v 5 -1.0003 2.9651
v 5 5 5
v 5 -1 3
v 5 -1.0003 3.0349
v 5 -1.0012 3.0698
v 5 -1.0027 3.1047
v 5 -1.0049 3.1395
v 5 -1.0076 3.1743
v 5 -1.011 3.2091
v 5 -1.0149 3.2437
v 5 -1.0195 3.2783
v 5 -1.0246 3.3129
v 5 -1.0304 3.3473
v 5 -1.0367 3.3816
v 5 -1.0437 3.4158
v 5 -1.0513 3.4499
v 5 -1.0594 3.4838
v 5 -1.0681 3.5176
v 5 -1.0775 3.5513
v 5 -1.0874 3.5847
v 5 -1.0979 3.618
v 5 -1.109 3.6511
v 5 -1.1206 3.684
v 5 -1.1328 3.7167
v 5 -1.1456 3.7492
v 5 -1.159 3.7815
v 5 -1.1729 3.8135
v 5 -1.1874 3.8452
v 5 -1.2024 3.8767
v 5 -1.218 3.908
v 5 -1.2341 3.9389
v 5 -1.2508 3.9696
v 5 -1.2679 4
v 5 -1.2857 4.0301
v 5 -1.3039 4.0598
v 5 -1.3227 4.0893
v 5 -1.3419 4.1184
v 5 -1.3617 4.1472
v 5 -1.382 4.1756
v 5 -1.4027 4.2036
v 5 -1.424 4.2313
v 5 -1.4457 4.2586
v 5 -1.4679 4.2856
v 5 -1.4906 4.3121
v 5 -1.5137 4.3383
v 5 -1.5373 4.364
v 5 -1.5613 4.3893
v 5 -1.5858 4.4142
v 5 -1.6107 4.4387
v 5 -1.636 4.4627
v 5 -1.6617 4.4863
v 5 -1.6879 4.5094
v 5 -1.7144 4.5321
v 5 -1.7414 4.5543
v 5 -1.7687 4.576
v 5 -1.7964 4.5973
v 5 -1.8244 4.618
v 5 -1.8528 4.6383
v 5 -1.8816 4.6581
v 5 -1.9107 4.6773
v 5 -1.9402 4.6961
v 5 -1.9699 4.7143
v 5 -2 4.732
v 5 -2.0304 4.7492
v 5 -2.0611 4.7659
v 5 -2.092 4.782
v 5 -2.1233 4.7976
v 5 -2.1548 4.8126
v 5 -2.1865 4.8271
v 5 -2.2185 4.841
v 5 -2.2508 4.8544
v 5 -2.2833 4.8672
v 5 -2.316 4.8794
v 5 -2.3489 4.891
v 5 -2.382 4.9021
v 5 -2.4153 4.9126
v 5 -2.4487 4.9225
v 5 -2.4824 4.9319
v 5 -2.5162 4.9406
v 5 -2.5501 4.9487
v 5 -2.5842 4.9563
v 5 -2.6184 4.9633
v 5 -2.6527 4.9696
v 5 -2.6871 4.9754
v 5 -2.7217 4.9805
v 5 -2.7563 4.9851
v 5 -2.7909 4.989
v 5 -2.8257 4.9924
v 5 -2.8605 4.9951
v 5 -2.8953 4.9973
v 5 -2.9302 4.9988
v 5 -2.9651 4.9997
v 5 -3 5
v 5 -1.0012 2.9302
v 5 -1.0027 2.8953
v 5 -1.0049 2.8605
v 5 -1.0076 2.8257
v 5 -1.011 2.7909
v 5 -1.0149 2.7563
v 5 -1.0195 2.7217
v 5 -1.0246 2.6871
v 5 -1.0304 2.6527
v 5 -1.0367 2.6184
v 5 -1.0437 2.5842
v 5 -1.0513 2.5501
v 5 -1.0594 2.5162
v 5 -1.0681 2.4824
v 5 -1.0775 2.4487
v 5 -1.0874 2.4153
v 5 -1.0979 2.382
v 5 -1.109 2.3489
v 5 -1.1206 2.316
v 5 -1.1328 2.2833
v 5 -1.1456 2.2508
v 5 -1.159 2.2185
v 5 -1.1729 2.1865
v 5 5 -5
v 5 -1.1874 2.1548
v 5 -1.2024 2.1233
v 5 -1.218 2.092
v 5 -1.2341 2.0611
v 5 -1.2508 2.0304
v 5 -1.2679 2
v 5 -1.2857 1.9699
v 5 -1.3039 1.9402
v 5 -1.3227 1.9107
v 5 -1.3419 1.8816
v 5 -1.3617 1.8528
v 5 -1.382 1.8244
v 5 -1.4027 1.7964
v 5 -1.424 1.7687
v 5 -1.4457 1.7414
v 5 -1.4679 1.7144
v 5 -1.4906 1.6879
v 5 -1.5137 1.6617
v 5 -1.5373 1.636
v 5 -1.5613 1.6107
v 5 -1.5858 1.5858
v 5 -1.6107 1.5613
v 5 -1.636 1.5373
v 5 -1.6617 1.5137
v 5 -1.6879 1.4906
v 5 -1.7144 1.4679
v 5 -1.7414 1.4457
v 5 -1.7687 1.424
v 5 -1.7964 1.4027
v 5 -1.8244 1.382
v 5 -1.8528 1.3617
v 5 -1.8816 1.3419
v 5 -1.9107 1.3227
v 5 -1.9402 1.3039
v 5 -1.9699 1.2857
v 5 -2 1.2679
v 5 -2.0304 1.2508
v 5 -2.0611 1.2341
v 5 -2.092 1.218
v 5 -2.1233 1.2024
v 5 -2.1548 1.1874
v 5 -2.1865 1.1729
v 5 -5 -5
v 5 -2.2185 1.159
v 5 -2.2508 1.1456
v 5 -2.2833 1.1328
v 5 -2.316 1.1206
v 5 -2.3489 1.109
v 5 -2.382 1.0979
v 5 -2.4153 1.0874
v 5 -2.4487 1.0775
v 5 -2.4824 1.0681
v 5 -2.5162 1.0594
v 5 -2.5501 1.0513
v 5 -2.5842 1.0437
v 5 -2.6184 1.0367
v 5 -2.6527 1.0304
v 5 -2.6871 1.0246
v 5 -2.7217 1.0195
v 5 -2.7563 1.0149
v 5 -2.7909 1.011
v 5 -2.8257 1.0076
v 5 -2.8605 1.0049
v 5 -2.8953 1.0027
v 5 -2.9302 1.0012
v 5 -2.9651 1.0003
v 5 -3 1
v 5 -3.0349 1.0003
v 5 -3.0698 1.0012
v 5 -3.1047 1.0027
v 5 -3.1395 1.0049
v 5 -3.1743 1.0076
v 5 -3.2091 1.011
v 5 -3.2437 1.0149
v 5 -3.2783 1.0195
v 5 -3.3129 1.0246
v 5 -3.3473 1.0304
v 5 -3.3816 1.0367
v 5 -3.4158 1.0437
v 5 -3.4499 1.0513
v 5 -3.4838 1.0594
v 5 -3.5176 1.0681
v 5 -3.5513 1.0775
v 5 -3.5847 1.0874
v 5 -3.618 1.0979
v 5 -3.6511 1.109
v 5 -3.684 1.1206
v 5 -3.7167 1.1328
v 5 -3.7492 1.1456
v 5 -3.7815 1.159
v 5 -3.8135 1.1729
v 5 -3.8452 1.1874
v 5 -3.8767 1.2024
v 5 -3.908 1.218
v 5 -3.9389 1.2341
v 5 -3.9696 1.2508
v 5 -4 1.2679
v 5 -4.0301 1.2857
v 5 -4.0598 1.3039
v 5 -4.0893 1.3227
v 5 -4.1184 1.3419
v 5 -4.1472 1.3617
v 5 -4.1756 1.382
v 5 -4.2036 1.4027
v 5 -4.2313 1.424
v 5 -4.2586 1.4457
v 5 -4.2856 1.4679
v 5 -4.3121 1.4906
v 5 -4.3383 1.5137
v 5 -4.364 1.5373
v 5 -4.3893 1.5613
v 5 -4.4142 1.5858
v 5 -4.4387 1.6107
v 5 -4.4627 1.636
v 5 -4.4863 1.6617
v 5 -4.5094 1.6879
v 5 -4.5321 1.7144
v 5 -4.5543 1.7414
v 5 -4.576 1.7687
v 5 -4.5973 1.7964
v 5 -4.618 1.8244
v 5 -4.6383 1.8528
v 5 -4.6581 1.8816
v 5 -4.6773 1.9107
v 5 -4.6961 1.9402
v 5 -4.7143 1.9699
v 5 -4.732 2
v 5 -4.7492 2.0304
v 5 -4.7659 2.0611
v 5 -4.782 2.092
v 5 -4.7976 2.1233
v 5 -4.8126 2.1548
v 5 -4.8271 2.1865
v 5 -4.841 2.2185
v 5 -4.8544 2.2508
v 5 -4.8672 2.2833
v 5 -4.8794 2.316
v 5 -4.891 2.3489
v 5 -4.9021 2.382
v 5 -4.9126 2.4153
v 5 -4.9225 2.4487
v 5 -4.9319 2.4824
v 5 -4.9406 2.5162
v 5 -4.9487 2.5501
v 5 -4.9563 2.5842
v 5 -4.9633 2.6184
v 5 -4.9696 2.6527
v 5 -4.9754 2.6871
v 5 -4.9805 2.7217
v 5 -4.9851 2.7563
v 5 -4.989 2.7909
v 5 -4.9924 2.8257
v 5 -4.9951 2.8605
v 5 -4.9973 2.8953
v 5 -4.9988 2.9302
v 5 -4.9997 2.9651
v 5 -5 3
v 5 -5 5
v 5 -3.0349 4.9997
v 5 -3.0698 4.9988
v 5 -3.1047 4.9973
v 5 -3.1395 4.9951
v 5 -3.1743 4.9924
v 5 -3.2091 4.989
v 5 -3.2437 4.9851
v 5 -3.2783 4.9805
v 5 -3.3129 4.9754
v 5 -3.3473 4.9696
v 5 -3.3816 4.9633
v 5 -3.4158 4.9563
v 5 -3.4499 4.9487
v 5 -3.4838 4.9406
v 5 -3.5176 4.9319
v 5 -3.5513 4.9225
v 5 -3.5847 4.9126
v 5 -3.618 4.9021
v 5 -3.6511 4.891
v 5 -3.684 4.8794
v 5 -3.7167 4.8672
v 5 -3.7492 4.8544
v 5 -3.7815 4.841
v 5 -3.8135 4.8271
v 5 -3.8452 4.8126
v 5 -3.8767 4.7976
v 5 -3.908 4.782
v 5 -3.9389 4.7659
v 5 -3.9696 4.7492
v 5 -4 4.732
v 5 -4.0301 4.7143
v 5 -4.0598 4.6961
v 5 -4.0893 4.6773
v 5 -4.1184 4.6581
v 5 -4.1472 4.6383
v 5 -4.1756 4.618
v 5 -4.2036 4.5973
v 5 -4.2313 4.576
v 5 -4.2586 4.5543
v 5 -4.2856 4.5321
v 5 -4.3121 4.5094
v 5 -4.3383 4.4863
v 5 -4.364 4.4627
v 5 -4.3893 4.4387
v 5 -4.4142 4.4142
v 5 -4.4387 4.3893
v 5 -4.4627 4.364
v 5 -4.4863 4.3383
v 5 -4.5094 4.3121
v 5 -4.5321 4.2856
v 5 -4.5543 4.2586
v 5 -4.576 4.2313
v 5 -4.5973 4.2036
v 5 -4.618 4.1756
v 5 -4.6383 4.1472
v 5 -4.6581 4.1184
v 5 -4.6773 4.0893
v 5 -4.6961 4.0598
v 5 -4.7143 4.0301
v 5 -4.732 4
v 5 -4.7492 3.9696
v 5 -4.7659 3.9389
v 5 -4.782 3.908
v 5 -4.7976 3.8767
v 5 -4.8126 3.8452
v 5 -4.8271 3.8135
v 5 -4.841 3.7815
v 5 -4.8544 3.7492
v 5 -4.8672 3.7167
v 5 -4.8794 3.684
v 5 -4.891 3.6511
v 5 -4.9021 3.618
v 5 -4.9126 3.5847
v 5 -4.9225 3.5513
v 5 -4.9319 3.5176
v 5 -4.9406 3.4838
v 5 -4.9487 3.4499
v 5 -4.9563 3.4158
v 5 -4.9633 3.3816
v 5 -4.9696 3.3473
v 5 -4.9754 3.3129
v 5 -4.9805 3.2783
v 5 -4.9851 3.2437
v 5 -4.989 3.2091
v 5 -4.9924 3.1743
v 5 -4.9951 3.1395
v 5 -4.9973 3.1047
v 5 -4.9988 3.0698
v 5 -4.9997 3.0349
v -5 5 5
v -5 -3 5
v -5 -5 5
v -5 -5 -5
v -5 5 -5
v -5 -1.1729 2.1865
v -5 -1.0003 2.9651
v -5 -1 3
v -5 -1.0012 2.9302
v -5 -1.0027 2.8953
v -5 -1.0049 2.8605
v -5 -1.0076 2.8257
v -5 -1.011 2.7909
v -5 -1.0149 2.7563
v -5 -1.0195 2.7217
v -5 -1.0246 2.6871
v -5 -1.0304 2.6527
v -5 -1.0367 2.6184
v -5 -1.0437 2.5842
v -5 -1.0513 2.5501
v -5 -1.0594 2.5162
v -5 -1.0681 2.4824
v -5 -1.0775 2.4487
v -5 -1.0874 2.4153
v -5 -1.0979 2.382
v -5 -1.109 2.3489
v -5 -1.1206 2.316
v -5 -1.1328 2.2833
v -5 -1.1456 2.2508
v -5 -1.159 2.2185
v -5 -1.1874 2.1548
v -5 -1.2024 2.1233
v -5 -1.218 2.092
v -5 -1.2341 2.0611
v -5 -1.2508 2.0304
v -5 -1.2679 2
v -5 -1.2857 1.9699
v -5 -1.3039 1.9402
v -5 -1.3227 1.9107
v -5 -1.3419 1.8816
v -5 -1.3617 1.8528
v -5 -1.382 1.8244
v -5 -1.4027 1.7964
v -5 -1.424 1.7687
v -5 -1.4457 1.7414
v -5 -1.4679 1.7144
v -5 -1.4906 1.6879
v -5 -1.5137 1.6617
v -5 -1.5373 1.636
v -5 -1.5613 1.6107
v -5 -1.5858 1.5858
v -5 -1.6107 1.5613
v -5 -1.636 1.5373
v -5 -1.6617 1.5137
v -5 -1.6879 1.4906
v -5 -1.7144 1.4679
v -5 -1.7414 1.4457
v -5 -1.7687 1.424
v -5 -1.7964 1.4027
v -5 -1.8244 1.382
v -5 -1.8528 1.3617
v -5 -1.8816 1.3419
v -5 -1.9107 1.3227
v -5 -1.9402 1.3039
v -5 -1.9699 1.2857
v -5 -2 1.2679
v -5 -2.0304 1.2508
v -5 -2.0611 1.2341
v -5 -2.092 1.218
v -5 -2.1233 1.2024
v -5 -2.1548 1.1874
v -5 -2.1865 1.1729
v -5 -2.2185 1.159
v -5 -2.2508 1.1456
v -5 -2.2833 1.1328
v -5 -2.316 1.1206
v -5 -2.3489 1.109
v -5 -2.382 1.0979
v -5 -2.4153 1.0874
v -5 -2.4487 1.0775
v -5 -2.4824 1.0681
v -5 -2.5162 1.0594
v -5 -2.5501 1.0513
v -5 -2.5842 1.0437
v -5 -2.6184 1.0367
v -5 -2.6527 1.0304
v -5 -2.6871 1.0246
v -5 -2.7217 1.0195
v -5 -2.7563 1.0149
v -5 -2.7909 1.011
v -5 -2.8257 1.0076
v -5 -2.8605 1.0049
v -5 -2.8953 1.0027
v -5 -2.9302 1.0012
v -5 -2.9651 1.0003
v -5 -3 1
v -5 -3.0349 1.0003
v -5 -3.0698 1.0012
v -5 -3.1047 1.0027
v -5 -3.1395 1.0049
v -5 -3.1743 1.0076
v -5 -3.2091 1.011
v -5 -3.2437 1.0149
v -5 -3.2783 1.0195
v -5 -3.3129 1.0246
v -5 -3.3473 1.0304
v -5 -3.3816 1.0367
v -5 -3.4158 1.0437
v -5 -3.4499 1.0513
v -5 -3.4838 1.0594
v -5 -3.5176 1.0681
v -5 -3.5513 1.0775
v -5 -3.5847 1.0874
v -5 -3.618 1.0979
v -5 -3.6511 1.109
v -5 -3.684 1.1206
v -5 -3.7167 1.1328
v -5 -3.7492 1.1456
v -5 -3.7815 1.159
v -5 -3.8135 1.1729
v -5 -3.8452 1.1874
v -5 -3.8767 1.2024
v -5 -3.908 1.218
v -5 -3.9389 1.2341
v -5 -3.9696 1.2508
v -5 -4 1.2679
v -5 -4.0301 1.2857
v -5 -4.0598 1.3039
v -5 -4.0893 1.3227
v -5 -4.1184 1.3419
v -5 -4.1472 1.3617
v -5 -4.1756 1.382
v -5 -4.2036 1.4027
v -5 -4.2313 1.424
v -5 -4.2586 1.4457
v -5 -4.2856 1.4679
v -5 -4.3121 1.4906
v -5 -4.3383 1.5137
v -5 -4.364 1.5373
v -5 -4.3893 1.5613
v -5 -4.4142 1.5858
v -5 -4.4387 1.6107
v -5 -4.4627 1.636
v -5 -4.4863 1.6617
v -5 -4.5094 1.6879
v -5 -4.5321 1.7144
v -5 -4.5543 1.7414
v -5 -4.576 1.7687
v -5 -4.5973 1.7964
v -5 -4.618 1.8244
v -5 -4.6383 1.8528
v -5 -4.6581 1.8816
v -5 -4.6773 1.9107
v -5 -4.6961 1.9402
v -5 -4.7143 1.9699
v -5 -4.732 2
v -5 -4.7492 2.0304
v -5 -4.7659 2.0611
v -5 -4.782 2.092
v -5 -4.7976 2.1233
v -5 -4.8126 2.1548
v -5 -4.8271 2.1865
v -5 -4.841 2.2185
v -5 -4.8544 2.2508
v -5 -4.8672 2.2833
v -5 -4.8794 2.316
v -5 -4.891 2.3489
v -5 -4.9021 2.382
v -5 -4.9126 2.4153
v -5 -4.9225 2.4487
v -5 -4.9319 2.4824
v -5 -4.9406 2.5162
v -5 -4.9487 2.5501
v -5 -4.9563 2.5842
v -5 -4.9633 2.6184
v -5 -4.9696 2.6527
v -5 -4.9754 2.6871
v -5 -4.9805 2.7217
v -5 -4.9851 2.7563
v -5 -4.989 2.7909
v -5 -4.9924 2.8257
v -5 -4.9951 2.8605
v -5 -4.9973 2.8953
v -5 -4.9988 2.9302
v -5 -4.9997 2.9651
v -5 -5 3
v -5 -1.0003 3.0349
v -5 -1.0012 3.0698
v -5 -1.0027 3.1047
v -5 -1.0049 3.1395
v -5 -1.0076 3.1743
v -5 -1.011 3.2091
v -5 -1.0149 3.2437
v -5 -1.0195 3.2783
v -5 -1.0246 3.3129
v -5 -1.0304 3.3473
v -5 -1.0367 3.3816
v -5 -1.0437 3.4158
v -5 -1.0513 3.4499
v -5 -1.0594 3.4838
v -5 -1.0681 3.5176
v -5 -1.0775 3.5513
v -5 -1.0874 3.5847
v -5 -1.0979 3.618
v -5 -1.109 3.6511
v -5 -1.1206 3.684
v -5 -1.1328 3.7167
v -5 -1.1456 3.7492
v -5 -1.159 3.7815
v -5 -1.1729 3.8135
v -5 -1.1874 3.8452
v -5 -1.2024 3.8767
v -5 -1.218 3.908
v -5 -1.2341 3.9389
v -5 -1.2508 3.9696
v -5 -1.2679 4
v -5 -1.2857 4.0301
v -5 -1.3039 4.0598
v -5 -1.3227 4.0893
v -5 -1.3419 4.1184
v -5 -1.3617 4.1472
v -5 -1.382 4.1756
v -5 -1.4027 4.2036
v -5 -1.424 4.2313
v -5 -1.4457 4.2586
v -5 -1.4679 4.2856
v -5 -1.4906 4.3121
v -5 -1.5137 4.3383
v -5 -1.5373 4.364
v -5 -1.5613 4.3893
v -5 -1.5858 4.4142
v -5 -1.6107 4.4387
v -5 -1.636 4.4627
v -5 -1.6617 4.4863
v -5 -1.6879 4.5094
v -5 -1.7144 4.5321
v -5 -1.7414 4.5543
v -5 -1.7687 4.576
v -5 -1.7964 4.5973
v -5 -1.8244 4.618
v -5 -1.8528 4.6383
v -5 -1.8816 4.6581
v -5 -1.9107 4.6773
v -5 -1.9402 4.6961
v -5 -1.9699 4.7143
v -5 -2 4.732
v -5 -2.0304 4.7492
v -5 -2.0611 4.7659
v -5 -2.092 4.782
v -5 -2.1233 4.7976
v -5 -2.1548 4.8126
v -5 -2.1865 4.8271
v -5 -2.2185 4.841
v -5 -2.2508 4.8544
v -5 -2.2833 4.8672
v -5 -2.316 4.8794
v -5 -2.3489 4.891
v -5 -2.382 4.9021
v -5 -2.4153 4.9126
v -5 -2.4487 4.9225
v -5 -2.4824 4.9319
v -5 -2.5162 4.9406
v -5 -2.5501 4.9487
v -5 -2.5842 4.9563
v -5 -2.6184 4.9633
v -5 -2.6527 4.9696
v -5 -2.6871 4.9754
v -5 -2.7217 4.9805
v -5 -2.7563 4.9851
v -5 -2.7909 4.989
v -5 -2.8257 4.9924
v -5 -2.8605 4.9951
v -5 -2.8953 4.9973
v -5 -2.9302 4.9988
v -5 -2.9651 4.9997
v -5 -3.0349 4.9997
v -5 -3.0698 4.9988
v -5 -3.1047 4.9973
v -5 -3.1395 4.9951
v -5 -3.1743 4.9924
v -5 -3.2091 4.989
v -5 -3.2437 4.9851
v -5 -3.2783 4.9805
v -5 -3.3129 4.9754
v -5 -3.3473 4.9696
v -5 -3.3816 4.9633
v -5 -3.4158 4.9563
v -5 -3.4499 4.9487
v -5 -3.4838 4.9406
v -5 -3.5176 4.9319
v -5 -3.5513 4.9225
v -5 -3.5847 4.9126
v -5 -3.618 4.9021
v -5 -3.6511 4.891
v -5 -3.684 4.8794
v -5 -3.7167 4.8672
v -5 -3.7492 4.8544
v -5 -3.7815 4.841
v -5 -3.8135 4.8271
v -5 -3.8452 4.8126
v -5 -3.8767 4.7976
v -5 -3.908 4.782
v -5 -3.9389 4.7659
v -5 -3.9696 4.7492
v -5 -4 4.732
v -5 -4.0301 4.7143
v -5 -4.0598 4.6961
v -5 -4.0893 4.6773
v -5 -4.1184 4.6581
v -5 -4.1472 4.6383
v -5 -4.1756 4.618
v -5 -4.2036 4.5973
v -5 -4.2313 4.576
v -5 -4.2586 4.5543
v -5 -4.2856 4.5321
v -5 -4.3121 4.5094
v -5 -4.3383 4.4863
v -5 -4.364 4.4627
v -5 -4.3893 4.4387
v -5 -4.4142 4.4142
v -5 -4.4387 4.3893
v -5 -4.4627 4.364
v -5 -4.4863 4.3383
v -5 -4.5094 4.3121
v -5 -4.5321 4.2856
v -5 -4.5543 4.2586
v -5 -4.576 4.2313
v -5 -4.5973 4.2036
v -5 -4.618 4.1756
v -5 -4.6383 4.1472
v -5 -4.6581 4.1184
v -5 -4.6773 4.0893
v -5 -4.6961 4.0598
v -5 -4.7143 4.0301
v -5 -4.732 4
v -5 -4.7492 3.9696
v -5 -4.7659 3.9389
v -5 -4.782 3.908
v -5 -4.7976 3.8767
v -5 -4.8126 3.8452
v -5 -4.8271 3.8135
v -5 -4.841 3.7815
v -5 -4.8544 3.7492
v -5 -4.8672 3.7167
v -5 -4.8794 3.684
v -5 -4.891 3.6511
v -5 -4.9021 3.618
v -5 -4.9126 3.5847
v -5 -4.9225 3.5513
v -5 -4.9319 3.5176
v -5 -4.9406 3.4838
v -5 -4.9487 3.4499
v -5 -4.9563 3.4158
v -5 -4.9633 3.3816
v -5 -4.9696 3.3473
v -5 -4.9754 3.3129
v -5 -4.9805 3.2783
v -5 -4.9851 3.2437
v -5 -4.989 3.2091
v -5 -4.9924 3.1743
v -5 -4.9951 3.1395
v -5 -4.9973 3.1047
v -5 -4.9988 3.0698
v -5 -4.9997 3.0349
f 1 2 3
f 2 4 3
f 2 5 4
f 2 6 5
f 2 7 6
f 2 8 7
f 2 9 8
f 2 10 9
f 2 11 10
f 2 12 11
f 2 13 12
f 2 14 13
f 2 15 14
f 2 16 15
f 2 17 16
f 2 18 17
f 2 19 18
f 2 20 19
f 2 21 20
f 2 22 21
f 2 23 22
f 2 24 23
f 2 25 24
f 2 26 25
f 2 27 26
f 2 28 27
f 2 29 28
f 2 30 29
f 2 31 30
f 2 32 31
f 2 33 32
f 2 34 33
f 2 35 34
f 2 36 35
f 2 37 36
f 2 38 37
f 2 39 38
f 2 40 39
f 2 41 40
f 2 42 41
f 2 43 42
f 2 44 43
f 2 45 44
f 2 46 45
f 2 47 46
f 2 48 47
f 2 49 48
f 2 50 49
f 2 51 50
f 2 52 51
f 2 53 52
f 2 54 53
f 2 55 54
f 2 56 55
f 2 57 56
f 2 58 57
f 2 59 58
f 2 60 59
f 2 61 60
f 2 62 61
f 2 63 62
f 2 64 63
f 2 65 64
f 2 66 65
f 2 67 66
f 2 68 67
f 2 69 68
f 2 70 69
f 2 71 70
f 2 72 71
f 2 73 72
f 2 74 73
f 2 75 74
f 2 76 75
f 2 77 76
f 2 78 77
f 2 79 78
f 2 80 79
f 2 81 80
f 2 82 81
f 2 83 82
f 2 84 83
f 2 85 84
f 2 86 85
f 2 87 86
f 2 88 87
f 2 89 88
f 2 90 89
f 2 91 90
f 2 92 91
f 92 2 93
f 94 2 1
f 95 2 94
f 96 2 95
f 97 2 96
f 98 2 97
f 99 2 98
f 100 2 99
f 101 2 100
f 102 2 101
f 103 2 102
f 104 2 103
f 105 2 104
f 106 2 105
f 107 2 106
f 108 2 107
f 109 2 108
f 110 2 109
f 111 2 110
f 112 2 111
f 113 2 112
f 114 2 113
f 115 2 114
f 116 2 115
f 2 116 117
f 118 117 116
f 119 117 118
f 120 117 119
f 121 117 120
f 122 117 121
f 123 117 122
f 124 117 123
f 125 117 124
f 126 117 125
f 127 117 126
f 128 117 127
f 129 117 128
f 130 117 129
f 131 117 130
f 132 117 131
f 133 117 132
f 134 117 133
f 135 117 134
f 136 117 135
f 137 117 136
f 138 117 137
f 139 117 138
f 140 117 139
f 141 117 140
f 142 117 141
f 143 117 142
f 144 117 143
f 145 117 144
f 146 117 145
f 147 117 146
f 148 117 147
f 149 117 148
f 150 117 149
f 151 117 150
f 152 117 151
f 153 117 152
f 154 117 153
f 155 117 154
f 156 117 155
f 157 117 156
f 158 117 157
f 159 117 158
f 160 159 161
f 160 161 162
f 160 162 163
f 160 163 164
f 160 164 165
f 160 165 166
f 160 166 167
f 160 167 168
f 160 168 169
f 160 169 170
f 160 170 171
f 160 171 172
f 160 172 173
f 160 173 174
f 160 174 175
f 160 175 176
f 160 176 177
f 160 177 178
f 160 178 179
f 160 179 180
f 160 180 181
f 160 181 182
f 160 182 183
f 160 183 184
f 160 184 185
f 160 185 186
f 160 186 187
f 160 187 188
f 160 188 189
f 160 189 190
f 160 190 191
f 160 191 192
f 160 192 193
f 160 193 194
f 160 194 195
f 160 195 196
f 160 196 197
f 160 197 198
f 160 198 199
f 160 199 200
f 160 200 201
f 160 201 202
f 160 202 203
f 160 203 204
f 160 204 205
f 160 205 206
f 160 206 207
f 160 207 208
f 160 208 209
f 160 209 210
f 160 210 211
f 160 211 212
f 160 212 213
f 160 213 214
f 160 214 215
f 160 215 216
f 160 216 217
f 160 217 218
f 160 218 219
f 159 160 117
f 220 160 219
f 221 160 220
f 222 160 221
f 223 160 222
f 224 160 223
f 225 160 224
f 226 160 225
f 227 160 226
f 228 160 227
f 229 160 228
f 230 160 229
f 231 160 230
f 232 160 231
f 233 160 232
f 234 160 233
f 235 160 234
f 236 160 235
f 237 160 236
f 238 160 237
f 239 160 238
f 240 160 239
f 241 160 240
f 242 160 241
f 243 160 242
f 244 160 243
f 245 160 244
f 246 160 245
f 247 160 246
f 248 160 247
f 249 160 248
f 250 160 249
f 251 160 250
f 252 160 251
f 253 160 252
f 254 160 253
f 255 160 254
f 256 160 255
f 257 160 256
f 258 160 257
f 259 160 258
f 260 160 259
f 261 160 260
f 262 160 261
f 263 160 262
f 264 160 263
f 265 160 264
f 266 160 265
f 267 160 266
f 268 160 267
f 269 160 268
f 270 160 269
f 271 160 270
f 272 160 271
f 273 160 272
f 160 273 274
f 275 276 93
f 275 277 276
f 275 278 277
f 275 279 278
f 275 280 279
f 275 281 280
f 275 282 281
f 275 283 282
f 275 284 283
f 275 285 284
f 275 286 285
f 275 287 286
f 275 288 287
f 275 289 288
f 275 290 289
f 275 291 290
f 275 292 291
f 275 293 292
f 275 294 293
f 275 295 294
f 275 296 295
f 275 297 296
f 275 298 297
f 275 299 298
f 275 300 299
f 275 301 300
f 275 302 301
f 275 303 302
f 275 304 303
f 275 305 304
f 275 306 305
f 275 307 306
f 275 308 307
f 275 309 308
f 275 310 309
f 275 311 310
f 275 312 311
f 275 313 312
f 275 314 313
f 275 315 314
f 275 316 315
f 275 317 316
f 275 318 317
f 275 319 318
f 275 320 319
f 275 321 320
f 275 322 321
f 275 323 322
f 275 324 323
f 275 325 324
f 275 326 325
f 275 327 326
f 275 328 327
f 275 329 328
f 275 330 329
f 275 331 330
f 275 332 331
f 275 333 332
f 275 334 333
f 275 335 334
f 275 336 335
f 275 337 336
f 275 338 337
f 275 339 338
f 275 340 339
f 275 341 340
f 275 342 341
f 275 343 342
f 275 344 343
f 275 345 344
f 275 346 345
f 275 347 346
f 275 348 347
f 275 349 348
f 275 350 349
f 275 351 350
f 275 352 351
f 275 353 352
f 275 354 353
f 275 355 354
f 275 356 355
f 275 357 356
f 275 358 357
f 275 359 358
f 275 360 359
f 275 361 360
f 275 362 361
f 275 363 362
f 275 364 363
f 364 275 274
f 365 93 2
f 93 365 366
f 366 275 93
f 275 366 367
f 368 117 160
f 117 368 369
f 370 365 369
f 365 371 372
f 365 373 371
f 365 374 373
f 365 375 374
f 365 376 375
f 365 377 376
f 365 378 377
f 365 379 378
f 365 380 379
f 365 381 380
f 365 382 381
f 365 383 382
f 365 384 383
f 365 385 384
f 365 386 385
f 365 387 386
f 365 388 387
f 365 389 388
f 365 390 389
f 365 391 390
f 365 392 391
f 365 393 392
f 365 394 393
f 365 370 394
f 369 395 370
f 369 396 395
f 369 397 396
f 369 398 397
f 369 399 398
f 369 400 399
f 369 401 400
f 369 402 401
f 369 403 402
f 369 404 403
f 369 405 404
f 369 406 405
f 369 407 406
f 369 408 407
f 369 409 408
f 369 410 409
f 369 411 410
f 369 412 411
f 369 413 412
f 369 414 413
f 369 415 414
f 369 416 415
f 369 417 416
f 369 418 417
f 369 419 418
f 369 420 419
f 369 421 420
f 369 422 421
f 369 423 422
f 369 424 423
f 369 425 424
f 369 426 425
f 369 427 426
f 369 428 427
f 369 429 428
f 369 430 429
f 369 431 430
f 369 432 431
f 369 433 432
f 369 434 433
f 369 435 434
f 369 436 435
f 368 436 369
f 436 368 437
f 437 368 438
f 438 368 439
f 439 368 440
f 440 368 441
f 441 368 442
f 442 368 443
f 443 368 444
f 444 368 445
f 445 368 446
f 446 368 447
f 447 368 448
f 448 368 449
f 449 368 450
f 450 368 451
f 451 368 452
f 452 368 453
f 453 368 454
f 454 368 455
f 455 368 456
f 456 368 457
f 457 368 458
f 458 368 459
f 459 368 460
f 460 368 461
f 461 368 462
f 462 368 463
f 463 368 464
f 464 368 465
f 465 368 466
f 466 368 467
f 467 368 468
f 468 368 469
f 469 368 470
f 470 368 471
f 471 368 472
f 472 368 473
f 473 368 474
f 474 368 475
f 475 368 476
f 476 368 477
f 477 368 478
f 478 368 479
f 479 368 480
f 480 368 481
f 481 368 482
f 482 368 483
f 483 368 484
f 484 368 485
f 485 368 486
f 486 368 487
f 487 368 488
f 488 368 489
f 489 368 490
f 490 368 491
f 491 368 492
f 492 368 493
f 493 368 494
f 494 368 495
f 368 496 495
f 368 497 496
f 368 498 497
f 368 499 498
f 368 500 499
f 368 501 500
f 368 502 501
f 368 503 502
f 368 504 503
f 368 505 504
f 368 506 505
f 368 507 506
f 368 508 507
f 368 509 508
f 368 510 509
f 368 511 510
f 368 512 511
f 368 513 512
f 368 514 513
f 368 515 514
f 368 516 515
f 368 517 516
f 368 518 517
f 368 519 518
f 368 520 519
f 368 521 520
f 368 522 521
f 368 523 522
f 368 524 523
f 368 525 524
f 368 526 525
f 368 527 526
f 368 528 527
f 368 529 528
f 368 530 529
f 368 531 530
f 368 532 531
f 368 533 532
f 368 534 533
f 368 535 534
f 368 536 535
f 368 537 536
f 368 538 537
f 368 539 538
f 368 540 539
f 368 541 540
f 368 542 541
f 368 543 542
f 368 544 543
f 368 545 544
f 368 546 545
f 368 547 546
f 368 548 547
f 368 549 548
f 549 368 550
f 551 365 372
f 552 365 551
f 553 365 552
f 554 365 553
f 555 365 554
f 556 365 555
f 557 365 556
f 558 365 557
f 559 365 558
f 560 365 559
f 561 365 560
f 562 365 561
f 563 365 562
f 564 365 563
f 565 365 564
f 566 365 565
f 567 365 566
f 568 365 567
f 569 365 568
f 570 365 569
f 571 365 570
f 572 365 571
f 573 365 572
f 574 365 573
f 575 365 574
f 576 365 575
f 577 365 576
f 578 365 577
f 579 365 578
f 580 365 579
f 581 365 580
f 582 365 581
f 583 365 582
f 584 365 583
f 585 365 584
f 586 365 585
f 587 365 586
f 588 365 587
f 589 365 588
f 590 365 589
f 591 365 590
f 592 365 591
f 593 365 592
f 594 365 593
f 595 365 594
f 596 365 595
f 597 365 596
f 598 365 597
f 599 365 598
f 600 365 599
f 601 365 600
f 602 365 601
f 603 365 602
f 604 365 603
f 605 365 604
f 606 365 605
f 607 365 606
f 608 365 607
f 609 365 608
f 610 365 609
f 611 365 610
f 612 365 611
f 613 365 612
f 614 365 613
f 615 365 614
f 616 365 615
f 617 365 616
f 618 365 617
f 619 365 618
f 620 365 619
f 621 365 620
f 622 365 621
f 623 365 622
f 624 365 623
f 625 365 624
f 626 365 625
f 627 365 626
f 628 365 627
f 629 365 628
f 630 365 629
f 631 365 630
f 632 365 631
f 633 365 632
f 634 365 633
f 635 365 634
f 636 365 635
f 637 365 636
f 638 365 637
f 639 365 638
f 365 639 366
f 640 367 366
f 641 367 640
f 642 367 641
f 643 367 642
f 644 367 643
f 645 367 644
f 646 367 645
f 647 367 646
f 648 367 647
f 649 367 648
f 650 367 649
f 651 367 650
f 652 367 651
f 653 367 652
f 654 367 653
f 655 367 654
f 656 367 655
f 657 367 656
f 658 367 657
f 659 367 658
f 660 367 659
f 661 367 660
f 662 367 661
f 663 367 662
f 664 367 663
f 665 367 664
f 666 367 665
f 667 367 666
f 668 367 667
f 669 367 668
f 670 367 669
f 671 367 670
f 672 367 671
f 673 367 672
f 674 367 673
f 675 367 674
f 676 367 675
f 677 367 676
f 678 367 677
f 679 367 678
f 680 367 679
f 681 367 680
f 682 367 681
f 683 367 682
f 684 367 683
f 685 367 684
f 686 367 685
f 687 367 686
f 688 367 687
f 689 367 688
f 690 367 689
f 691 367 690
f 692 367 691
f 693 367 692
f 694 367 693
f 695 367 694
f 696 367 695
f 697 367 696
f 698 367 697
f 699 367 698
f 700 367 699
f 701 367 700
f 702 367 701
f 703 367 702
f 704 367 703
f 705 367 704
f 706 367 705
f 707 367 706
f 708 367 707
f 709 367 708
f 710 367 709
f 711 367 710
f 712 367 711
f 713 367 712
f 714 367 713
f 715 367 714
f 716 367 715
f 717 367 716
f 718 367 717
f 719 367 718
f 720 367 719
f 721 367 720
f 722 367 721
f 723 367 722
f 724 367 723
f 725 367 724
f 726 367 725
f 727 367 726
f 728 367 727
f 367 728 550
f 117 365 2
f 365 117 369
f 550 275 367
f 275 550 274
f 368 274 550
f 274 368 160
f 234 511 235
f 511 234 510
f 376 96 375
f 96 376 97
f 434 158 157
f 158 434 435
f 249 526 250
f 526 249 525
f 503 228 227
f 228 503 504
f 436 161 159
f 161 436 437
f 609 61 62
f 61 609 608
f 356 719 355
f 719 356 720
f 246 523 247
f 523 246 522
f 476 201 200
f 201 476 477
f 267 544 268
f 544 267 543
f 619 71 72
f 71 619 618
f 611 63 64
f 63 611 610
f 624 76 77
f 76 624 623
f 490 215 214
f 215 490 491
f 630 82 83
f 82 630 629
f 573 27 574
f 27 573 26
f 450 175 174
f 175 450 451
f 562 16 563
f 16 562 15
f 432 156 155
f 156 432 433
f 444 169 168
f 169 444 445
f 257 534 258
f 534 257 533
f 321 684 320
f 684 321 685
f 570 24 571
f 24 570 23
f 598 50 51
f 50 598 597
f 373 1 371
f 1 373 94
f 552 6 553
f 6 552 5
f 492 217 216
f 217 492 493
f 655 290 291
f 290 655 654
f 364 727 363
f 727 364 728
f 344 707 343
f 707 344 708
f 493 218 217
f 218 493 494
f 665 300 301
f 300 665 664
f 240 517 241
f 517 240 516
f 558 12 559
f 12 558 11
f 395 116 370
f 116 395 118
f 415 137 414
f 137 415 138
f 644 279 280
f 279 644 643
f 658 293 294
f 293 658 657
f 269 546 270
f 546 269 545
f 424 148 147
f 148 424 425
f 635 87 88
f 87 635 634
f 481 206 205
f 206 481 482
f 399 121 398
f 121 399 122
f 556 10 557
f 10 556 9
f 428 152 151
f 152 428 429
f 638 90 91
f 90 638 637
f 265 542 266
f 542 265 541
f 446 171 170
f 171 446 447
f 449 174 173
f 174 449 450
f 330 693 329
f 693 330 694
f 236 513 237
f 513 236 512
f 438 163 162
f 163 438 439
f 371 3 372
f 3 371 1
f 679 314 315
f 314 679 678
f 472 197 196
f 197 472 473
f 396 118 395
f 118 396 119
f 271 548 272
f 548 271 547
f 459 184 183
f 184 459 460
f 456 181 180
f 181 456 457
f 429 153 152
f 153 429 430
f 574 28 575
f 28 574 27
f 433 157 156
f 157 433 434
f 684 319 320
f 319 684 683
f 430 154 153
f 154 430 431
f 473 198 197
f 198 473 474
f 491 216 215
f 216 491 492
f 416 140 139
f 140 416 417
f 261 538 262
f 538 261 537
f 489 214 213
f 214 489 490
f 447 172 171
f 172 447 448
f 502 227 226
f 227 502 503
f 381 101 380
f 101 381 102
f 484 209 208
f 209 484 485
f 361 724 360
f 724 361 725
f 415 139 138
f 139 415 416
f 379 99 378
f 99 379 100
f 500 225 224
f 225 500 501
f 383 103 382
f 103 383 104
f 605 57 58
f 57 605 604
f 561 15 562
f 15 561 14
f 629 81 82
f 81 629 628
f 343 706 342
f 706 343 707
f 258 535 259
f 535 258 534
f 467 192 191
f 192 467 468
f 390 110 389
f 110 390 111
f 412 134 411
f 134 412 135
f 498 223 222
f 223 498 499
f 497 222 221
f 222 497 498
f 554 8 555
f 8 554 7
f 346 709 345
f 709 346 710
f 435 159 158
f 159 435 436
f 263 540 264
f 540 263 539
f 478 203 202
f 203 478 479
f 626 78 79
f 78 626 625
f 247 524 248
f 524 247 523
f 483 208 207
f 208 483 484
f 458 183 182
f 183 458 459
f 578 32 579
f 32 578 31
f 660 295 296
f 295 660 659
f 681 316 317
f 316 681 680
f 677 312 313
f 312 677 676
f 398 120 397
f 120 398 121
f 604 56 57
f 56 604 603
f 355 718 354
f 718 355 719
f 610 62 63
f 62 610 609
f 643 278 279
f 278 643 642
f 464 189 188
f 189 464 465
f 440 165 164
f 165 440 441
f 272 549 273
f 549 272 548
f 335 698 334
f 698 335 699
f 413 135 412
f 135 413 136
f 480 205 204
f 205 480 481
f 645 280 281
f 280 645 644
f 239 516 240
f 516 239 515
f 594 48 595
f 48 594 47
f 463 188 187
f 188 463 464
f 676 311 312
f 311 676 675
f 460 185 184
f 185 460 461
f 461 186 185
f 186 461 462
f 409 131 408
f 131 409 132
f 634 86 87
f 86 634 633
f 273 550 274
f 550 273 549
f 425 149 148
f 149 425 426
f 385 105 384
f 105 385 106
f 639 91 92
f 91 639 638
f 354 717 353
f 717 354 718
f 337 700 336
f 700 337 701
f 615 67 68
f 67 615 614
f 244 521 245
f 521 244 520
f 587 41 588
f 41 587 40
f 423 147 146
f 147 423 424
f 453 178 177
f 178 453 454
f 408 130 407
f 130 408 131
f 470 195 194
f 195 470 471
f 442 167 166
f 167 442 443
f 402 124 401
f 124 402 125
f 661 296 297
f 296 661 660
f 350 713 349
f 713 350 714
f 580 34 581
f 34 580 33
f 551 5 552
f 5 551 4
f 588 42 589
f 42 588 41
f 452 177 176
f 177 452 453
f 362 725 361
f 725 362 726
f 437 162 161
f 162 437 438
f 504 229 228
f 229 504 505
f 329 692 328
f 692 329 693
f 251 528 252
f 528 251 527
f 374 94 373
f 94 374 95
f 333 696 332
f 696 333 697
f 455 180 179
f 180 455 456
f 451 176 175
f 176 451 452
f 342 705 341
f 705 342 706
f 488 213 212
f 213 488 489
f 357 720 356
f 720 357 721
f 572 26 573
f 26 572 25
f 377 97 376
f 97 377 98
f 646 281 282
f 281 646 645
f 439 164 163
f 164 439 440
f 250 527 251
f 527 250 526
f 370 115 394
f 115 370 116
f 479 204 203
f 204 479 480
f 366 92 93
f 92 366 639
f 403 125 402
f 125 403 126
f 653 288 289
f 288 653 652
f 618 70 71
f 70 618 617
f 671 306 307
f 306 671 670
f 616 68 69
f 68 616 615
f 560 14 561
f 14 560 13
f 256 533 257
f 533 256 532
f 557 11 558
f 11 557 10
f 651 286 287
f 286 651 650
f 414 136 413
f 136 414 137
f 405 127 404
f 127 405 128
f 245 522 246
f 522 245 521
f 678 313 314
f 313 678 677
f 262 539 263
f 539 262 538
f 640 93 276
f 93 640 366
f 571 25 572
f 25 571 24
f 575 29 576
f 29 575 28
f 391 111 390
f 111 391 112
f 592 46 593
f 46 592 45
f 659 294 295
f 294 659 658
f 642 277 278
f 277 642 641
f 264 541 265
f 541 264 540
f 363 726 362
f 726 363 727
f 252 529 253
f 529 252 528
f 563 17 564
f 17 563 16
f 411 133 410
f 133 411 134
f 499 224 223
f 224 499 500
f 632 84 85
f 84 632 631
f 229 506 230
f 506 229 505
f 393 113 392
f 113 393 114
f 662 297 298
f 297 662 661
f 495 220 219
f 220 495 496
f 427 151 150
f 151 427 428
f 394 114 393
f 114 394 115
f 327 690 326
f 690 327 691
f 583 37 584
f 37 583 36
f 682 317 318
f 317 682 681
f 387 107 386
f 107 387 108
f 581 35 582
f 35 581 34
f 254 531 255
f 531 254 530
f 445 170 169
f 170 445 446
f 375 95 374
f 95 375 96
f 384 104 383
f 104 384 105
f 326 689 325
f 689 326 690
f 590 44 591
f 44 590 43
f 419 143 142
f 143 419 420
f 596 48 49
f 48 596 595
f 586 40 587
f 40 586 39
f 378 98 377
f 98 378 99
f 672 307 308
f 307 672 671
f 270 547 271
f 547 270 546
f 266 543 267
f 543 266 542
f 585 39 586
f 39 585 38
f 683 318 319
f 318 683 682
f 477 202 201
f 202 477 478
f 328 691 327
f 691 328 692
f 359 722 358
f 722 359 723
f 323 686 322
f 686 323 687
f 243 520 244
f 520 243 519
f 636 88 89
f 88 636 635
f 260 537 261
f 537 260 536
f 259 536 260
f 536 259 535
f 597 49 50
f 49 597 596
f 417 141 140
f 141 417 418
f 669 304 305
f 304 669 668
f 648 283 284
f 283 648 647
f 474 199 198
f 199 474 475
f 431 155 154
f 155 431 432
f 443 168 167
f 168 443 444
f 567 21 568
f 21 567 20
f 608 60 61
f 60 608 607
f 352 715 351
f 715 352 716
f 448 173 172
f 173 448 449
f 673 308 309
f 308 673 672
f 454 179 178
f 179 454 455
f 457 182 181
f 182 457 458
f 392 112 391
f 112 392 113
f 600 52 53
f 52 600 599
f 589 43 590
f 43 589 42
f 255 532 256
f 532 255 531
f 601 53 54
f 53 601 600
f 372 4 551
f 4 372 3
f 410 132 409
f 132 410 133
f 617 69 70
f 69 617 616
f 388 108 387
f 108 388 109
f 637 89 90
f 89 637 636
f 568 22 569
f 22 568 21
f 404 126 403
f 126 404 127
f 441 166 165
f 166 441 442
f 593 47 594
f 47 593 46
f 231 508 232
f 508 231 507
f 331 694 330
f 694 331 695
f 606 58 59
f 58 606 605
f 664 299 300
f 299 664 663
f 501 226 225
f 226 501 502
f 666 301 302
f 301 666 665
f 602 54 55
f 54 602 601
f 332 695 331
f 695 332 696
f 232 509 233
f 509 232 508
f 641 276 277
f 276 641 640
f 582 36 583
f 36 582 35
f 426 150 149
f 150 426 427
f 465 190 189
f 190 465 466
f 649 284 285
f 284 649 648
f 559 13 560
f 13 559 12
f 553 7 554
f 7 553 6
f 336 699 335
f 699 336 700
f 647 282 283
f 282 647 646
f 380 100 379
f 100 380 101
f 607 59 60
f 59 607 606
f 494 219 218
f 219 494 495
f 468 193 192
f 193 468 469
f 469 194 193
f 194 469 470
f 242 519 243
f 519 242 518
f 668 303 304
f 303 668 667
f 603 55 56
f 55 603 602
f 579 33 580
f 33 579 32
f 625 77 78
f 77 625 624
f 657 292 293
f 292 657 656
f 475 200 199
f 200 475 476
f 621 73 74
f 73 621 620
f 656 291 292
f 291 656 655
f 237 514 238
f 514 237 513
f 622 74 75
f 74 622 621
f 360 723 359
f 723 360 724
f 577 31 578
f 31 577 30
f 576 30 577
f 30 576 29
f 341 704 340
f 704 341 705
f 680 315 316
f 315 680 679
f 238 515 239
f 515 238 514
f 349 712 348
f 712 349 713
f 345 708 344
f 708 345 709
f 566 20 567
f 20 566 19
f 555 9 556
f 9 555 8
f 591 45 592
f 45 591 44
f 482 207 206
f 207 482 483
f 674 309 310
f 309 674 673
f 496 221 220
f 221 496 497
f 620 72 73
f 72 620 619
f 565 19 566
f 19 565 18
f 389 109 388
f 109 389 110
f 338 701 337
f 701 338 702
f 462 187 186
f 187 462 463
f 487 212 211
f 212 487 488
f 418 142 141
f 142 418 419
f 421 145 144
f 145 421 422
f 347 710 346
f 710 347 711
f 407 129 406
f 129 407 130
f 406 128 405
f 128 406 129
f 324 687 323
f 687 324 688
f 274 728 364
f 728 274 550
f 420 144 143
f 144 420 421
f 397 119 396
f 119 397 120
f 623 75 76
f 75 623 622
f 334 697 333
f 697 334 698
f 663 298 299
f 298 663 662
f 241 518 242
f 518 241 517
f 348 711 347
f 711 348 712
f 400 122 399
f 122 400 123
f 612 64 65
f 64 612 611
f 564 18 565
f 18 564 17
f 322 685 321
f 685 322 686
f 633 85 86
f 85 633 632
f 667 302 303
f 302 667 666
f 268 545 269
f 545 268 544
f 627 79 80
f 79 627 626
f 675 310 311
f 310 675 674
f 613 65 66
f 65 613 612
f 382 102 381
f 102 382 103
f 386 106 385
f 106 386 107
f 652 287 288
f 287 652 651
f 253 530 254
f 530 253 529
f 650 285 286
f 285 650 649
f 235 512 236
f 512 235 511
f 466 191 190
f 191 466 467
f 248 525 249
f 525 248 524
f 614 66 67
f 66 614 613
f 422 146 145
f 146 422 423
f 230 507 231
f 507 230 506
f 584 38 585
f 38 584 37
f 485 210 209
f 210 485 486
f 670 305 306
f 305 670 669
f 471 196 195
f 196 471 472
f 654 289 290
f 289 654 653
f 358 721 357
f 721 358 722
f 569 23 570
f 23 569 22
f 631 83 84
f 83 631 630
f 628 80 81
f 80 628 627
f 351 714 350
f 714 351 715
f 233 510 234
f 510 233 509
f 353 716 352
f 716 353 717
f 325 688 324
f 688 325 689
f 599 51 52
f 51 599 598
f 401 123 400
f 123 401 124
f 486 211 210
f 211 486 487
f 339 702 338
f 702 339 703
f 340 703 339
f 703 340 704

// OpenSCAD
pad = 0.1;	// Padding to maintain manifold
box_l = 10;	// Length
box_w = 10;	// Width
box_h = 10;	// Height
round_r = 2;	// Radius of round
smooth = 360;	// Number of facets of rounding cylinder

// The idea is to make the edge of the box into a cylinder
difference() {
	cube([box_l, box_w, box_h], center = true);

	translate([0, -box_w/2+round_r, box_h/2-round_r]) {
		rotate(a=[0,90,0])
			cylinder(box_l+4*pad,round_r,round_r,center=true,$fn=smooth);
	}
}
